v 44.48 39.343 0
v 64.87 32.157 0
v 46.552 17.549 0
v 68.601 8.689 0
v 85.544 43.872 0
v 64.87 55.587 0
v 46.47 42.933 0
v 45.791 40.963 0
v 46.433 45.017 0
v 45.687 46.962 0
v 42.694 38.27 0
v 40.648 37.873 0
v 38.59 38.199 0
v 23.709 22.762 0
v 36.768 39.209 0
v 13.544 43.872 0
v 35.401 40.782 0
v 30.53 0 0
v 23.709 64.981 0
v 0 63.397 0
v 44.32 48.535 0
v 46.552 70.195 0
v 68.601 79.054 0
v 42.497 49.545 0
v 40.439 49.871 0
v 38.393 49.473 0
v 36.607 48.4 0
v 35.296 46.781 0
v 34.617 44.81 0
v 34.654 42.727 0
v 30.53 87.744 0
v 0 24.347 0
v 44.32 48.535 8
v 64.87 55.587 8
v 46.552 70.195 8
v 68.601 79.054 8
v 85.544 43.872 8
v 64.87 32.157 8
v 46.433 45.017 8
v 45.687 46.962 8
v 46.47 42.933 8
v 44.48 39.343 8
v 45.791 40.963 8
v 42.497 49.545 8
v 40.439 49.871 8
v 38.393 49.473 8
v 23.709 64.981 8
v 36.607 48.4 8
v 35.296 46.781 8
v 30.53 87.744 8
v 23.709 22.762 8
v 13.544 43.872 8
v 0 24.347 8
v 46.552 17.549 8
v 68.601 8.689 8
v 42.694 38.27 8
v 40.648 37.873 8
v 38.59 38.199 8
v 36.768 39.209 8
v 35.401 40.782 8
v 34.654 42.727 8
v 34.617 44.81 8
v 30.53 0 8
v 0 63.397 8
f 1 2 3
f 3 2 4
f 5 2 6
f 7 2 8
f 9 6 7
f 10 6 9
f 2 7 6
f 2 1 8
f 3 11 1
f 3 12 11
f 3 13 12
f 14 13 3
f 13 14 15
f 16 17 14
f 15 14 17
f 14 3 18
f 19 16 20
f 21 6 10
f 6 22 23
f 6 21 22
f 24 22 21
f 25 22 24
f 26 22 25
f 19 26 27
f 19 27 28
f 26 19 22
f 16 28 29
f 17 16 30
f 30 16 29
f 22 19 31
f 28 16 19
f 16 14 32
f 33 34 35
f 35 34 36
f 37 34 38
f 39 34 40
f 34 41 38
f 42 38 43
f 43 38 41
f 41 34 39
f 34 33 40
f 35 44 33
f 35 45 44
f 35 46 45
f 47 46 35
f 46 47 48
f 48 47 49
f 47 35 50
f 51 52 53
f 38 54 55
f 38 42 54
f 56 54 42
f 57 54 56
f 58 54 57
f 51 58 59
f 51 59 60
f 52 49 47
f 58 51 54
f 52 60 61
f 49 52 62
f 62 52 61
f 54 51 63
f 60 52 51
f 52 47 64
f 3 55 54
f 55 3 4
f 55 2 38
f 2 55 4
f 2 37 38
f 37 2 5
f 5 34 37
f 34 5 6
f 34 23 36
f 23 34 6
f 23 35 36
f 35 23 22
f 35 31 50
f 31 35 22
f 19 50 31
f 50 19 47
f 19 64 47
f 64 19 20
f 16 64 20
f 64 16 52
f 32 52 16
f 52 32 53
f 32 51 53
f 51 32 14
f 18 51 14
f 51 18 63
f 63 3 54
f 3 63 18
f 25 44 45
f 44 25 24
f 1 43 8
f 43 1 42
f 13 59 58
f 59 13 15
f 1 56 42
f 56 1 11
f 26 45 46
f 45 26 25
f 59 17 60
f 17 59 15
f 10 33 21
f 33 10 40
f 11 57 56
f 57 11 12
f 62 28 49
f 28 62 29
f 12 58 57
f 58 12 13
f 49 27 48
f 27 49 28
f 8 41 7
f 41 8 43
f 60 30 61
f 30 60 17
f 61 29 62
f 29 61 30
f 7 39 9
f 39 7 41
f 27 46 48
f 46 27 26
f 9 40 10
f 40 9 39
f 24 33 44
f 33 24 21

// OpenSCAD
$fn = 32;

// ----------------------------------------------------------------------
// Star wheel: 7-point blunt, R45
// ----------------------------------------------------------------------

// --- parameters (mm) ---
n_points = 7;             // number of points / teeth
r_out = 45;               // tip radius
r_in = 27;                // root radius
bore_r = 6;               // centre bore radius
plate_t = 8;              // plate thickness, Z (extrusion height)
bore_d = 12;              // centre bore diameter

profile = [[85.544, 43.872], [64.87, 55.587], [68.601, 79.054], [46.552, 70.195], [30.53, 87.744], [23.709, 64.981], [0, 63.397], [13.544, 43.872], [0, 24.347], [23.709, 22.762], [30.53, 0], [46.552, 17.549], [68.601, 8.689], [64.87, 32.157]];  // primary outline, 14 points, counter clockwise
void_1 = [[46.433, 45.017], [45.687, 46.962], [44.32, 48.535], [42.497, 49.545], [40.439, 49.871], [38.393, 49.473], [36.607, 48.4], [35.296, 46.781], [34.617, 44.81], [34.654, 42.727], [35.401, 40.782], [36.768, 39.209], [38.59, 38.199], [40.648, 37.873], [42.694, 38.27], [44.48, 39.343], [45.791, 40.963], [46.47, 42.933]];  // centre bore, 18 points

// --- the one profile operation ---
difference() {
  linear_extrude(height = plate_t) polygon(points = profile);
  translate([0, 0, -1])
    linear_extrude(height = plate_t + 2) polygon(points = void_1);
}
